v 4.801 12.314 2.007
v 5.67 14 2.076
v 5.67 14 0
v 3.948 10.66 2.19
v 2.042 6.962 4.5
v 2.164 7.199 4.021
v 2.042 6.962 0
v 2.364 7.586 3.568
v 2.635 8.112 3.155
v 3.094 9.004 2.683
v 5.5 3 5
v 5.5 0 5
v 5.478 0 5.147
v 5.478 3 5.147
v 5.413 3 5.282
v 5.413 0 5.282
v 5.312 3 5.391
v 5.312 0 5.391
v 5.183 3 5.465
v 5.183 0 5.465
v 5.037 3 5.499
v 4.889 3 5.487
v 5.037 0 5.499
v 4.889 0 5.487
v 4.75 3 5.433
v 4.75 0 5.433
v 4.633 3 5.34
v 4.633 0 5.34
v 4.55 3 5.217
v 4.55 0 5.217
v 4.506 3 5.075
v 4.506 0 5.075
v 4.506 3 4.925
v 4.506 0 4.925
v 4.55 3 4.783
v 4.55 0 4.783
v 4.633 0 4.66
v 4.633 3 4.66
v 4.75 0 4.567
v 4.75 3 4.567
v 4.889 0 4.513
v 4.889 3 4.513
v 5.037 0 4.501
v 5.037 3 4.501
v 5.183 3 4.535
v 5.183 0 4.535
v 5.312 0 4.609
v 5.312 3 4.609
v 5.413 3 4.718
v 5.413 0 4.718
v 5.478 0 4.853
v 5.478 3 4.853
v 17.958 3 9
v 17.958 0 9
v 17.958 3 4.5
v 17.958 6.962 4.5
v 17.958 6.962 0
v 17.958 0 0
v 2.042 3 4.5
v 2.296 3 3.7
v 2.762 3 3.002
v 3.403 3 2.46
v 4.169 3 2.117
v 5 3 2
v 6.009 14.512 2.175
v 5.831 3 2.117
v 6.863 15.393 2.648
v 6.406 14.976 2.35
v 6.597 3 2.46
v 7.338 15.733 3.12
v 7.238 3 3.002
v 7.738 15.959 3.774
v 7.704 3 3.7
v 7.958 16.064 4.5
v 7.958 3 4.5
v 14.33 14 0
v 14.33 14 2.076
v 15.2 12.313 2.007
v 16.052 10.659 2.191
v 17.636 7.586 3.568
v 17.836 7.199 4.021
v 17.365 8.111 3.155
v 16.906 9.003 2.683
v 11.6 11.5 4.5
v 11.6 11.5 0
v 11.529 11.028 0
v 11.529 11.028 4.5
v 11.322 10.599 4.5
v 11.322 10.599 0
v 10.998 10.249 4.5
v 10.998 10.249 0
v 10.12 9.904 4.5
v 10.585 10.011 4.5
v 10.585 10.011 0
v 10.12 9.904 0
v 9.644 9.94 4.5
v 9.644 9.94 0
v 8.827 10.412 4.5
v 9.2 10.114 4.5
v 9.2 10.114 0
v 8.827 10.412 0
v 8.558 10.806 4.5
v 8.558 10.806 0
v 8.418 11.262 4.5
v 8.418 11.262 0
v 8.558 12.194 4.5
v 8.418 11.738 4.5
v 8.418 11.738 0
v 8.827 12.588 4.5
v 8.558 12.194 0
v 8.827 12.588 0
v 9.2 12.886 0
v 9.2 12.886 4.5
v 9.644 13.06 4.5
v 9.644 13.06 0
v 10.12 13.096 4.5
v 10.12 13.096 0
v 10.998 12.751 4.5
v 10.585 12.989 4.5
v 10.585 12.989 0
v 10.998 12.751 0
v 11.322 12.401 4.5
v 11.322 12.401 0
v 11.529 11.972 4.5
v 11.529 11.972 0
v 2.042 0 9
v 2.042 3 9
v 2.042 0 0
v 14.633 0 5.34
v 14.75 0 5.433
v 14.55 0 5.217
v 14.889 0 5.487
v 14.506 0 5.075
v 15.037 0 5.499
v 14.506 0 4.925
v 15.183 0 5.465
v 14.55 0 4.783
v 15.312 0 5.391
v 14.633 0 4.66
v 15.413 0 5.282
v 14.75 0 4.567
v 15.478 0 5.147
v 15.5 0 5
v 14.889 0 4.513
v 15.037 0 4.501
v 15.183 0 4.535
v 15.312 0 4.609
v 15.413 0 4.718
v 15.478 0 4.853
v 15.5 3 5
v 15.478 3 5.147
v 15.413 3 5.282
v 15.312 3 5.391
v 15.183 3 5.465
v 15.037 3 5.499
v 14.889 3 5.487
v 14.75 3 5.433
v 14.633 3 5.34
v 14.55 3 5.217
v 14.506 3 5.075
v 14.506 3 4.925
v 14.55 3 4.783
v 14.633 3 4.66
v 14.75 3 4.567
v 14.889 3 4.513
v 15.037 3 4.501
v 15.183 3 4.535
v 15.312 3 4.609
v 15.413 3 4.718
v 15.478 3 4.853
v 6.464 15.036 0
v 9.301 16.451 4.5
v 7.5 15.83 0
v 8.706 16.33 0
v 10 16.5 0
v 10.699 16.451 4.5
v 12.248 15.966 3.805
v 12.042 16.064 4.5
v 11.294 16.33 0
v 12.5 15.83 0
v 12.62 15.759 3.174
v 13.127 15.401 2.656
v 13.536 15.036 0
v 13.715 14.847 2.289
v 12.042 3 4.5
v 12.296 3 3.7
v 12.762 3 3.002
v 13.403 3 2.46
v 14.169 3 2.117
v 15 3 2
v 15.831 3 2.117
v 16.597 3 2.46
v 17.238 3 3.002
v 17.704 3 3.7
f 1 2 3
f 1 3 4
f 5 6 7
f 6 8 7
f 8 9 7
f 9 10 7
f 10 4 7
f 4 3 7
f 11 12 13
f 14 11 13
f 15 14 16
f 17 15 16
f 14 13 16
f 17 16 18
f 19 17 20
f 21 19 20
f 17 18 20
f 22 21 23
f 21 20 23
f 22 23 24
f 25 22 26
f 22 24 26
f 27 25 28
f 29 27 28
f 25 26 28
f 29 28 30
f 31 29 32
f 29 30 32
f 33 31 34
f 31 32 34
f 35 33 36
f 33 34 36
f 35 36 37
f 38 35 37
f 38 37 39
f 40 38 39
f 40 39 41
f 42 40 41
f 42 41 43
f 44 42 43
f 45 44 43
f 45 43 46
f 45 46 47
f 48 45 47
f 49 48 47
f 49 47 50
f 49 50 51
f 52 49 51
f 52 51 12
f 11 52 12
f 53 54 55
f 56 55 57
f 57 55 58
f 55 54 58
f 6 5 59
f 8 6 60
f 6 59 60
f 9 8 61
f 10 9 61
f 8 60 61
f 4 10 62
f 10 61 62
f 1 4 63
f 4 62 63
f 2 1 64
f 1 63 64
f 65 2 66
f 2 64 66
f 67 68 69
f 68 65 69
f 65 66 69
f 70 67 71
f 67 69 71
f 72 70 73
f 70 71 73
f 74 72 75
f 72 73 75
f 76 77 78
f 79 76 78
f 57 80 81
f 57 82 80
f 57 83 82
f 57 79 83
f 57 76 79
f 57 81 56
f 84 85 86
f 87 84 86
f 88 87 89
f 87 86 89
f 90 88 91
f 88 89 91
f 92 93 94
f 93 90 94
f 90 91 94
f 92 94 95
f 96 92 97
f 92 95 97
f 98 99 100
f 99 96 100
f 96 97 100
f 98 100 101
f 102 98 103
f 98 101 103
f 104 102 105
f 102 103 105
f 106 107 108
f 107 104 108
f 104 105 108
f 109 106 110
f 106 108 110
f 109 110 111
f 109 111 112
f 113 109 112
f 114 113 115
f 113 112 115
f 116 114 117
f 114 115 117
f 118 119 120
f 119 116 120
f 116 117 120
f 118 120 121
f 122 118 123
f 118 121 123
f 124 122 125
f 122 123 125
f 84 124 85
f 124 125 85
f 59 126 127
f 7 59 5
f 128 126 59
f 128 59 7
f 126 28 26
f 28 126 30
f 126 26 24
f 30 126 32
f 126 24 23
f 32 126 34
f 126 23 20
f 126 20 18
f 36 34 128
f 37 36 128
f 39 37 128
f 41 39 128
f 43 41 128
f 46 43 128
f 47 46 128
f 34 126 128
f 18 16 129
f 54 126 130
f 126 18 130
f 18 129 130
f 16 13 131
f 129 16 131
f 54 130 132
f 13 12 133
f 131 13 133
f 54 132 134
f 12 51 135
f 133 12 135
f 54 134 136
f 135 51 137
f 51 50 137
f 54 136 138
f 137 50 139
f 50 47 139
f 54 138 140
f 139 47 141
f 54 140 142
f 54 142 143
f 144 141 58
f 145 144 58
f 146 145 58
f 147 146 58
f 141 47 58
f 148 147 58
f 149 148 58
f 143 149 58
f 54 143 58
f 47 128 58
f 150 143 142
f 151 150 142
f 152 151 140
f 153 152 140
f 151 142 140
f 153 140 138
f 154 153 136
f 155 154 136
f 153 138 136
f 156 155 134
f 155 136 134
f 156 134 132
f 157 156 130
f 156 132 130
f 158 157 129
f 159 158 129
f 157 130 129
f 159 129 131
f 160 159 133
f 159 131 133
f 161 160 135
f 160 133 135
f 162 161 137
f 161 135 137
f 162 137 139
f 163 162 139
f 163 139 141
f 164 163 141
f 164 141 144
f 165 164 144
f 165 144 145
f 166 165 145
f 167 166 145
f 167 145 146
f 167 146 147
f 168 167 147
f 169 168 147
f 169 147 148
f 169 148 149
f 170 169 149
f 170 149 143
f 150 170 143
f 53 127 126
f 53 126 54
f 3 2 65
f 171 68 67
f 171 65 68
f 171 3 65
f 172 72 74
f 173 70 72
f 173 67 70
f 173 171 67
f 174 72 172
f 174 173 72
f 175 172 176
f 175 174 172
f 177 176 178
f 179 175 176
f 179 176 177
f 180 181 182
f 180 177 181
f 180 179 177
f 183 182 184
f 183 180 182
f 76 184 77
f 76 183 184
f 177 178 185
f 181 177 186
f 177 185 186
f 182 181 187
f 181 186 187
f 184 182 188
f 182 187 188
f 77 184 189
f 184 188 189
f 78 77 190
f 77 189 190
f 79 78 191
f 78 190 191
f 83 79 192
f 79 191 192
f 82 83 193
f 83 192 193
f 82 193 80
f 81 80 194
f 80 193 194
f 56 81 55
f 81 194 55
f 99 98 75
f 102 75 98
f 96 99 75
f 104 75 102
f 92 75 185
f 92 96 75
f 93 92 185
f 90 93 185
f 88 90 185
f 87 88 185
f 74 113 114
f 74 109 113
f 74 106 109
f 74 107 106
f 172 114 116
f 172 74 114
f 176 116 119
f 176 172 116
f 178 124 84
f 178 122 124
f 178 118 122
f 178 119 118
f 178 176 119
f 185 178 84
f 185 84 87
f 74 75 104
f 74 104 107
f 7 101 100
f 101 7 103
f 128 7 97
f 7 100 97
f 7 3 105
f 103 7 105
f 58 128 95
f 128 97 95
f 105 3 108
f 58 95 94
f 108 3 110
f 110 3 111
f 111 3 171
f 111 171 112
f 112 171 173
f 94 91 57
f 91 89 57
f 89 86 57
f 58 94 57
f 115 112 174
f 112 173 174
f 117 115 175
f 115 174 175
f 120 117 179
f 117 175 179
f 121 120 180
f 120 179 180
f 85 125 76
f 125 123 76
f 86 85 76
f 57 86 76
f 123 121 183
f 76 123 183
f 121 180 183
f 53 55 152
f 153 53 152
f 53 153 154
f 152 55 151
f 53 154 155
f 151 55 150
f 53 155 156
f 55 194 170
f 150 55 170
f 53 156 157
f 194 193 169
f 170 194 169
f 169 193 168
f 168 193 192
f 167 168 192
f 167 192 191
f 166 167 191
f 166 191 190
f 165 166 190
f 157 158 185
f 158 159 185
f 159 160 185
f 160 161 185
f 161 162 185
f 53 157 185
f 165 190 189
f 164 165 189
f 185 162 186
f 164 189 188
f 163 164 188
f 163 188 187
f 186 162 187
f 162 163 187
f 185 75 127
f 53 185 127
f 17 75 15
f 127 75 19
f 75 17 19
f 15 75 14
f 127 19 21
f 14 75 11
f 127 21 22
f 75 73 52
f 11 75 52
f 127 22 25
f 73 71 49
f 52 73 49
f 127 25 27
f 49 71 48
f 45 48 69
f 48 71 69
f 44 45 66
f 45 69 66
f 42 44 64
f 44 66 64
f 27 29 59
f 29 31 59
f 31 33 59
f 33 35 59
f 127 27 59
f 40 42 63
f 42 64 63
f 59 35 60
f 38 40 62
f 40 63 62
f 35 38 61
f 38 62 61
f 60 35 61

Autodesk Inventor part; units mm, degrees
ref_plane "YZ Plane" through (0, 0, 0) normal (1, 0, 0) x (0, 1, 0)
ref_plane "XZ Plane" through (0, 0, 0) normal (0, 1, 0) x (-1, 0, 0)
ref_plane "XY Plane" through (0, 0, 0) normal (0, 0, 1) x (1, 0, 0)
sketch "Sketch1" plane through (0, 0, 0) normal (0, 0, 1) x (1, 0, 0)
  circle A0 centre (10, 11.5) radius 1.6
  line L0 (0, 0) -> (20.0001, 0)
  line L1 (0, 0) -> (0, 3)
  line L2 (20.0001, 0) -> (20.0001, 3)
  line L3 (0, 3) -> (16, 3) construction
  line L4 (20.0001, 3) -> (36.0001, 3) construction
  arc A1 (14.3301, 14) -> (5.6699, 14) centre (10, 11.5) ccw
  line L5 (10, 11.5) -> (5.6699, 14) construction
  line L6 (10, 11.5) -> (14.3301, 14) construction
  line L7 (5.6699, 14) -> (0, 3)
  line L8 (14.3301, 14) -> (20.0001, 3)
  dimension "d17" = 3
  dimension "d18" = 3
  dimension "d19" = 11.5
  dimension "d23" = 90
  dimension "d24" = 90
  dimension "d25" = 10
  dimension "d31" = 5
  dimension "d32" = 120
  dimension "d33" = 14
extrude "Extrusion1" add sketch "Sketch1" along normal blind 4.5
sketch "Sketch4" plane through (0, 0, 4.5) normal (0, 0, 1) x (1, 0, 0)
  line L0 (0, 3) -> (0, 0) projected
  line L1 (20.0001, 0) -> (20.0001, 3) projected
  line L2 (0, 0) -> (20.0001, 0)
  line L3 (20.0001, 0) -> (20.0001, 3)
  line L4 (3.884, 22.9404) -> (-0.9789, 3.2417) projected
  line L5 (20.0001, 3) -> (0, 3)
  line L6 (0, 3) -> (0, 0)
extrude "Extrusion2" add sketch "Sketch4" along normal blind 4.5
sketch "Sketch5" plane through (0, 0, 0) normal (0, -1, 0) x (1, 0, 0)
  circle A0 centre (5, 5) radius 0.5
  circle A1 centre (15, 5) radius 0.5
  line L0 (0, 0) -> (20.0001, 0) projected
  dimension "d13" = 1
  dimension "d14" = 1
  dimension "d38" = 5
  dimension "d39" = 5
extrude "Extrusion3" cut sketch "Sketch5" against normal blind 5.5
sketch "Sketch6" plane through (0, 3, 9) normal (0, 1, 0) x (1, 0, 0)
  circle A0 centre (5, 4) radius 0.5 projected
  circle A1 centre (5, 4) radius 3
  circle A2 centre (15, 4) radius 0.5 projected
  circle A3 centre (15, 4) radius 3
  line L0 (0, 9) -> (20.0001, 9) projected
  dimension "d34" = 6
  dimension "d35" = 6
  dimension "d40" = 5
  dimension "d41" = 5
extrude "Extrusion4" cut sketch "Sketch6" along normal up to next
sketch "Sketch7" plane through (0, 0, 0) normal (0, -1, 0) x (1, 0, 0)
  line L0 (0, 0) -> (0, 9) projected
  line L1 (2.042, 0) -> (0, 0)
  line L2 (0, 0) -> (0, 9)
  line L3 (0, 9) -> (2.042, 9)
  line L4 (2.042, 9) -> (2.042, 0)
extrude "Extrusion5" cut sketch "Sketch7" against normal up to next
sketch "Sketch8" plane through (20.0001, 0, 0) normal (0, -1, 0) x (1, 0, 0)
  line L0 (0, 4.5) -> (0, 9) projected
  line L1 (-2.042, 0) -> (0, 0)
  line L2 (0, 0) -> (0, 9)
  line L3 (0, 9) -> (-2.042, 9)
  line L4 (-2.042, 9) -> (-2.042, 0)
  point P0 (-20.0001, 0)
extrude "Extrusion6" cut sketch "Sketch8" against normal up to next
properties part number "lower_deck_short_shaft_mount_for_AD"
